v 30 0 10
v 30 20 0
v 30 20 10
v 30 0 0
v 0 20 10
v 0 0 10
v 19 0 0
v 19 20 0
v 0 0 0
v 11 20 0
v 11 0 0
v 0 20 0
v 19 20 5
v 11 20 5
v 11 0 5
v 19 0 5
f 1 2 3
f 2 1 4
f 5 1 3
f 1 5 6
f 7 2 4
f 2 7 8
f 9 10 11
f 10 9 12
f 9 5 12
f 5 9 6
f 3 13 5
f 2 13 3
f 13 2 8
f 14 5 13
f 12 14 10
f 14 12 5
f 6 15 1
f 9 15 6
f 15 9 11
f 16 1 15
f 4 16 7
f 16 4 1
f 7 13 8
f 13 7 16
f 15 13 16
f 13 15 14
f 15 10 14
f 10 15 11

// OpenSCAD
// 8 mm tunnel, flat ceiling carried by both walls: bridge span 8 mm > 5 mm.
difference() { cube([30, 20, 10]); translate([11, -1, -1]) cube([8, 22, 6]); }
